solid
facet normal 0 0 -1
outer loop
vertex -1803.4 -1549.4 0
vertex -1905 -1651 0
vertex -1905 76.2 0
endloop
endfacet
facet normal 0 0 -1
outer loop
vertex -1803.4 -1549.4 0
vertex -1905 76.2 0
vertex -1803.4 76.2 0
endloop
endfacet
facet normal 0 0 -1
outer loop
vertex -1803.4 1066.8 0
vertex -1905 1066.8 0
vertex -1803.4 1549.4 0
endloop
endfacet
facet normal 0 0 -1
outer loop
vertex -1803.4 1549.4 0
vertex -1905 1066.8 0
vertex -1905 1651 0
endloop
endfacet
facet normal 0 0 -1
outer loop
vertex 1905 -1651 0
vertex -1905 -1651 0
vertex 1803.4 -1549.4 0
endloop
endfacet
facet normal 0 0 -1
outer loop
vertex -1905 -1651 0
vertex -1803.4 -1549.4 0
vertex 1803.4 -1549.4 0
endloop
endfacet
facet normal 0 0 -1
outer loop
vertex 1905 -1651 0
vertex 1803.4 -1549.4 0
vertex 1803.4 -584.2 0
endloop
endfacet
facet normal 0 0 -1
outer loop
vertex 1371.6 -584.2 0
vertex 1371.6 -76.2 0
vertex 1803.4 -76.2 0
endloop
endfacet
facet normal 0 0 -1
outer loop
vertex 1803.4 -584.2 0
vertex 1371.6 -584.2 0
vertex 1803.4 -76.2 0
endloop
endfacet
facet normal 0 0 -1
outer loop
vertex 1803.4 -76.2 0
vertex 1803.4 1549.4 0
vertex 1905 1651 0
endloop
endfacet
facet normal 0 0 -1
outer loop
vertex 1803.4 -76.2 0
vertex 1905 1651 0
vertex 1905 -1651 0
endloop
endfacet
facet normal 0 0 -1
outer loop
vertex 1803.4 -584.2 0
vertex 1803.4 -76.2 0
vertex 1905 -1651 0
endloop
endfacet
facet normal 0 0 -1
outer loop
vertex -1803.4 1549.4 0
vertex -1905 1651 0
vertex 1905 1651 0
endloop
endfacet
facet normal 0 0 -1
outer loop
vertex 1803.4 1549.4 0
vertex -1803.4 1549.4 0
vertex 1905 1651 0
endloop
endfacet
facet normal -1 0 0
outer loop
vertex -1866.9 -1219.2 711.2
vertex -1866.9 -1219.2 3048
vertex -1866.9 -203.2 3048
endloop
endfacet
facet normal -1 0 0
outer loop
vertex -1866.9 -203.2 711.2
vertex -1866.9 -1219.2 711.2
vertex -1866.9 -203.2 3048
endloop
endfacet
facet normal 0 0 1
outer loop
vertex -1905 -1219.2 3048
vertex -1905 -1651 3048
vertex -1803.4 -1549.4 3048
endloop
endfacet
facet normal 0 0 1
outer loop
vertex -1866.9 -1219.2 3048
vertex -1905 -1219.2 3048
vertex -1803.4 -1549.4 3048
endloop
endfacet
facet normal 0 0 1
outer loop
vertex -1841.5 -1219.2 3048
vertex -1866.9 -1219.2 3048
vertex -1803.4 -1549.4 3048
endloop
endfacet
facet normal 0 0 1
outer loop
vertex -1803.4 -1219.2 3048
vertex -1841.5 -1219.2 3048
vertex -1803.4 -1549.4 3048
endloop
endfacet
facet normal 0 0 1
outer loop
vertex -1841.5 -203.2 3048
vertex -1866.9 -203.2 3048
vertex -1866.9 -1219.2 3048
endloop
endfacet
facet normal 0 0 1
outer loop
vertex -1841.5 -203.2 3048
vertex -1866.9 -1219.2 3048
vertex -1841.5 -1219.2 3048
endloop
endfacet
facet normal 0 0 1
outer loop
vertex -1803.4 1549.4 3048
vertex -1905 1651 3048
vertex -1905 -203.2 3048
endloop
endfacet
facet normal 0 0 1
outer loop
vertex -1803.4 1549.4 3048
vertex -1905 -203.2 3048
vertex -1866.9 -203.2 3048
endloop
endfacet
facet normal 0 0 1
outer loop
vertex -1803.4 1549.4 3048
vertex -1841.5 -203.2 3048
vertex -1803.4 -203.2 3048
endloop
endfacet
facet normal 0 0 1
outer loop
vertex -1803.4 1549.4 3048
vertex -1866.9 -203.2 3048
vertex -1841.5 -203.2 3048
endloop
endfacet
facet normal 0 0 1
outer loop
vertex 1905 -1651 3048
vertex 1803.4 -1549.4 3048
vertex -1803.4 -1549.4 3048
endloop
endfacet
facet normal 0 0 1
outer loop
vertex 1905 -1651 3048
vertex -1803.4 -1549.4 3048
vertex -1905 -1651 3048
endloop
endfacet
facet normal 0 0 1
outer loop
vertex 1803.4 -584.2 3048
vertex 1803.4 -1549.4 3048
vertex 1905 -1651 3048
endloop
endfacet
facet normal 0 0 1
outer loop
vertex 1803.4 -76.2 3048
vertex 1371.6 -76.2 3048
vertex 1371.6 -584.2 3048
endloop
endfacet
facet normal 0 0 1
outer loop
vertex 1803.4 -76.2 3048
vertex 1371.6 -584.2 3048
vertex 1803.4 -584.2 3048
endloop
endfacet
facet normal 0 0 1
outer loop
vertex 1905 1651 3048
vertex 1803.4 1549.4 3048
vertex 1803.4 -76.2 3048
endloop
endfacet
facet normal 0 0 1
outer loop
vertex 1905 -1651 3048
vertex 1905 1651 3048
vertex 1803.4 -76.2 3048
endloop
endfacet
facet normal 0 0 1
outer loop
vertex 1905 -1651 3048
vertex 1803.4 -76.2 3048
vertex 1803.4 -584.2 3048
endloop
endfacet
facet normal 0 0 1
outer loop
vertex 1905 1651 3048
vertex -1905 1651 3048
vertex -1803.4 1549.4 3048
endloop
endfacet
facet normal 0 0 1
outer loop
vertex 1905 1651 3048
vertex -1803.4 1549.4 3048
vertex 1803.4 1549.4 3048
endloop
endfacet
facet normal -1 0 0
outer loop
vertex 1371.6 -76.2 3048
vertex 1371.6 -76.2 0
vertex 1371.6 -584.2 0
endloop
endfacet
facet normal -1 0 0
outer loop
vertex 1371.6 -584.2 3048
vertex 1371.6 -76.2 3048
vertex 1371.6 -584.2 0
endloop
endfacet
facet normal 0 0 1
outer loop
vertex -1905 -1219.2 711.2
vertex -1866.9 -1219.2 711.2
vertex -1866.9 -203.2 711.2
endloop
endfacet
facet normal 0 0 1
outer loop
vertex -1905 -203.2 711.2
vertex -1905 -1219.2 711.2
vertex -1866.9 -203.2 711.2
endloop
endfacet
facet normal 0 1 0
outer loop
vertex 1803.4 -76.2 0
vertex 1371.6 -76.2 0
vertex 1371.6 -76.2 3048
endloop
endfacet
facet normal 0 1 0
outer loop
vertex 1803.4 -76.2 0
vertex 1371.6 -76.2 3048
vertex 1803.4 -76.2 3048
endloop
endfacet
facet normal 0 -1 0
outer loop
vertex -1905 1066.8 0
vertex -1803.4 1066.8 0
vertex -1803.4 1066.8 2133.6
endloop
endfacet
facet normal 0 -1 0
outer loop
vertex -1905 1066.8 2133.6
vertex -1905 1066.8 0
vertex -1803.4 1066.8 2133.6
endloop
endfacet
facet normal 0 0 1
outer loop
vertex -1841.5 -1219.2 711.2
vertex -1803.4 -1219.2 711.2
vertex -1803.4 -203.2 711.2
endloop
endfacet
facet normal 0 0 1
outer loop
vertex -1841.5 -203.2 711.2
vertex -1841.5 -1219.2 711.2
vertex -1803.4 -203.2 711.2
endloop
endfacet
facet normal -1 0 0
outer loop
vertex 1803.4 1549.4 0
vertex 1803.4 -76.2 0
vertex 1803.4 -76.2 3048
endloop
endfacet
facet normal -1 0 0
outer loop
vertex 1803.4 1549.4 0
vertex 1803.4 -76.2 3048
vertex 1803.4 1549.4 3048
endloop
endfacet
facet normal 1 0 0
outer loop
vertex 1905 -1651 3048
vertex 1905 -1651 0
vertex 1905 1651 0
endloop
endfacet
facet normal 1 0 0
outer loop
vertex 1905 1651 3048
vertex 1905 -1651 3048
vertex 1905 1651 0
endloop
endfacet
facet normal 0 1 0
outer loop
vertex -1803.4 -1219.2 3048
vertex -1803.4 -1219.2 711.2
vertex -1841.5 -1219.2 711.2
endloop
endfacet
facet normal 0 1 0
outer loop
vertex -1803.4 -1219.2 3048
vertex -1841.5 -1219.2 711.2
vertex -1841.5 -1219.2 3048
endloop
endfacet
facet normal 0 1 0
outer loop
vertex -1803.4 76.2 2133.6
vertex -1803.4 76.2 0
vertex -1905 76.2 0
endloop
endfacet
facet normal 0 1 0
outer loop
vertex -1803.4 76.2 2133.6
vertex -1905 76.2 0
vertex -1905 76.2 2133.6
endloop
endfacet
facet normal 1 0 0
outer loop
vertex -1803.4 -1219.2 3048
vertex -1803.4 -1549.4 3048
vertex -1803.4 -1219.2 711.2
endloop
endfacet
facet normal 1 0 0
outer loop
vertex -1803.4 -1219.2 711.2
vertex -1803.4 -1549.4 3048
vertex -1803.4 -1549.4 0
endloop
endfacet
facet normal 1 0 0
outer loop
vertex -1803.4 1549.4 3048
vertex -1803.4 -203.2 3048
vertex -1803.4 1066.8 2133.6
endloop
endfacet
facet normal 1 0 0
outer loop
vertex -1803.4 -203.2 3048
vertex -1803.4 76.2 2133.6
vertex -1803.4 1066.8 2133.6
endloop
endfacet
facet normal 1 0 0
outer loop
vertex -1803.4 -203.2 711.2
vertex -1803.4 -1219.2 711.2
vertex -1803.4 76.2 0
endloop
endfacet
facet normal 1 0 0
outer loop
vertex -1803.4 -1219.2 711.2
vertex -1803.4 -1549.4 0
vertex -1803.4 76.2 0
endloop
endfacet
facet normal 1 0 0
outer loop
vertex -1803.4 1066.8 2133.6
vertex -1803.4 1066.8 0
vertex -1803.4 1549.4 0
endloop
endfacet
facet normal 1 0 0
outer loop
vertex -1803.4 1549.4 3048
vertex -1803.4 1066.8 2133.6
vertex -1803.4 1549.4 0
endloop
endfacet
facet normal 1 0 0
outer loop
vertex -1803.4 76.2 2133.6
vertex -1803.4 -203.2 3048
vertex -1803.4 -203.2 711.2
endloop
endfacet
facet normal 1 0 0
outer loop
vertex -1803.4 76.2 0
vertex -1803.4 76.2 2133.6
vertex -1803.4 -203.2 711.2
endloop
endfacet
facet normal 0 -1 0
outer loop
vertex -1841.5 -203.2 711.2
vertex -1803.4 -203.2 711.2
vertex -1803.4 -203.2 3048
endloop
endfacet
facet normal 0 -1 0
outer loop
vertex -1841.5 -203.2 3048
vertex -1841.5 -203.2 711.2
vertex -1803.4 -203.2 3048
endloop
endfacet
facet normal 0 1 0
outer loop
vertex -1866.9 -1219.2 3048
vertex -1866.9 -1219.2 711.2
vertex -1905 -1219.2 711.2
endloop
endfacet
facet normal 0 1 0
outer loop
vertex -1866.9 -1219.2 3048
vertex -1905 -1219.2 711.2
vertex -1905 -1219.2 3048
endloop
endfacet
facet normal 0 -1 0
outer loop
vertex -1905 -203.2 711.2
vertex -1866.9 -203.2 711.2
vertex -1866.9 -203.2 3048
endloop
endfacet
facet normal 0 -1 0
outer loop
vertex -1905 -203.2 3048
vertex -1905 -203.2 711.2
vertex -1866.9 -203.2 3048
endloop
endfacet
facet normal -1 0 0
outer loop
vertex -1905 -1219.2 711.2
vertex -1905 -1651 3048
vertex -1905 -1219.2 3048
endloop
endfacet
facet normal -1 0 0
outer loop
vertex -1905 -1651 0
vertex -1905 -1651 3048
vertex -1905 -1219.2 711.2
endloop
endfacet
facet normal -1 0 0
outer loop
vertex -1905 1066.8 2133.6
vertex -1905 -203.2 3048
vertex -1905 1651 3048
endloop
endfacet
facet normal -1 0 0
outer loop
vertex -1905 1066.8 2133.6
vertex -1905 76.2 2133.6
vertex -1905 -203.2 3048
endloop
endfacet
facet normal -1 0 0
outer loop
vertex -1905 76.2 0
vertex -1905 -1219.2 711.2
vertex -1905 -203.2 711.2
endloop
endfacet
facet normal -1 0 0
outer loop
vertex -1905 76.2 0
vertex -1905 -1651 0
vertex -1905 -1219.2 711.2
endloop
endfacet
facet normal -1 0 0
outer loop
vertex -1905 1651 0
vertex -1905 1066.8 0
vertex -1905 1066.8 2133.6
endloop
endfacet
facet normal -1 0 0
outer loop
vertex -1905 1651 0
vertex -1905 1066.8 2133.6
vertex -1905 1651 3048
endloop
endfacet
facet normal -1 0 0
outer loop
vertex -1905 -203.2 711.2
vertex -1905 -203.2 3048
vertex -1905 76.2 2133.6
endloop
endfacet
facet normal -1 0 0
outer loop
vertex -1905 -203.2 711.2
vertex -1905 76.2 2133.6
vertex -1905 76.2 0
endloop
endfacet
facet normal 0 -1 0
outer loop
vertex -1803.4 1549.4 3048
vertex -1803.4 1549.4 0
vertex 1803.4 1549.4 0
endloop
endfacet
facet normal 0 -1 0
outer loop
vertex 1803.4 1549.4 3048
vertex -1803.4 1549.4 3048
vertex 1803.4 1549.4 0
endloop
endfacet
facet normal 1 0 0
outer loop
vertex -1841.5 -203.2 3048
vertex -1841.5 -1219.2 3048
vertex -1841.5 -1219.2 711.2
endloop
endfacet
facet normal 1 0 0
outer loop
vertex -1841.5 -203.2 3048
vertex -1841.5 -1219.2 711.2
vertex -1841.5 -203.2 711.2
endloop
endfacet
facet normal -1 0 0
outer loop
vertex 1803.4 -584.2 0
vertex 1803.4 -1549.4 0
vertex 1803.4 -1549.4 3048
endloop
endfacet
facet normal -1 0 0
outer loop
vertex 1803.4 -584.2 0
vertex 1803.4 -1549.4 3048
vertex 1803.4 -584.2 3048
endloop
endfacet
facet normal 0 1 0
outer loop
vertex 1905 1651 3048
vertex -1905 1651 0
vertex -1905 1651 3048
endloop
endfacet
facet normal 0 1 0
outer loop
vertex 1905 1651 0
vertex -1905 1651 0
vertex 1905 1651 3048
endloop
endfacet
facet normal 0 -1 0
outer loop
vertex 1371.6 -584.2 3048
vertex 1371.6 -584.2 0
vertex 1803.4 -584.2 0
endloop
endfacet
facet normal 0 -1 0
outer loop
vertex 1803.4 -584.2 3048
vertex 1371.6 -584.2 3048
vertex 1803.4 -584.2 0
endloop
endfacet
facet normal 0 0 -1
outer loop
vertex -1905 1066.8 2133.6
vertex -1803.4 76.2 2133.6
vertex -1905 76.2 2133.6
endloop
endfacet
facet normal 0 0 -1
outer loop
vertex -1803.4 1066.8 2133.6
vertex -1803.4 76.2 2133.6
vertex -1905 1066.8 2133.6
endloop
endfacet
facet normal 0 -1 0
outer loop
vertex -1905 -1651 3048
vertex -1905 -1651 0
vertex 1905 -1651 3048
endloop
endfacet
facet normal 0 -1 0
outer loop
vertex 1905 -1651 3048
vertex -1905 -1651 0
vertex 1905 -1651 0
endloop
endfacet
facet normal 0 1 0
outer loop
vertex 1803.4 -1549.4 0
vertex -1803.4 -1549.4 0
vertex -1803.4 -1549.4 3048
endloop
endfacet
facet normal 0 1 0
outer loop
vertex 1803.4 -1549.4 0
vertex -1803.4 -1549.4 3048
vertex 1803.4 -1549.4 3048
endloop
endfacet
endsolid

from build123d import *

# Parameters (mm, degrees)
F0_W     = 3810
F0_H     = 3302
F0_W_2   = 3606.8
F0_H_2   = 3098.8
F1_DEPTH = 3048
F2_W     = 990.6
F2_H     = 2133.6
F3_DEPTH = 101.6
F4_W     = 431.8
F4_H     = 508
F5_DEPTH = 3048
F6_W     = 1016
F6_H     = 2336.8
F7_DEPTH = 101.6
F8_W     = 25.4
F8_H     = 1016
F9_DEPTH = 2336.8


with BuildPart() as f1:
    # F0 (on Top) → F1 (new body)
    with BuildSketch(Plane.XY):
        Rectangle(F0_W, F0_H)
        Rectangle(F0_W_2, F0_H_2, mode=Mode.SUBTRACT)
    extrude(amount=F1_DEPTH)

    # F2 (on face) → F3 (cut, through all)
    with BuildSketch(Plane.YZ.offset(-1803.4)):
        with Locations((571.5, 1066.8)):
            Rectangle(F2_W, F2_H)
    extrude(amount=-F3_DEPTH, mode=Mode.SUBTRACT)

    # F4 (on face) → F5 (join, through all)
    with BuildSketch(Plane(origin=(0, 0, 0), x_dir=(1, 0, 0), z_dir=(0, 0, -1))):
        with Locations((1587.5, 330.2)):
            Rectangle(F4_W, F4_H)
    extrude(amount=-F5_DEPTH)

    # F6 (on face) → F7 (cut, through all)
    with BuildSketch(Plane.YZ.offset(-1803.4)):
        with Locations((-711.2, 1879.6)):
            Rectangle(F6_W, F6_H)
    extrude(amount=-F7_DEPTH, mode=Mode.SUBTRACT)

    # F8 (on face) → F9 (join, through all)
    with BuildSketch(Plane.XY.offset(711.2)):
        with Locations((-1854.2, -711.2)):
            Rectangle(F8_W, F8_H)
    extrude(amount=F9_DEPTH)


solid = f1.part
